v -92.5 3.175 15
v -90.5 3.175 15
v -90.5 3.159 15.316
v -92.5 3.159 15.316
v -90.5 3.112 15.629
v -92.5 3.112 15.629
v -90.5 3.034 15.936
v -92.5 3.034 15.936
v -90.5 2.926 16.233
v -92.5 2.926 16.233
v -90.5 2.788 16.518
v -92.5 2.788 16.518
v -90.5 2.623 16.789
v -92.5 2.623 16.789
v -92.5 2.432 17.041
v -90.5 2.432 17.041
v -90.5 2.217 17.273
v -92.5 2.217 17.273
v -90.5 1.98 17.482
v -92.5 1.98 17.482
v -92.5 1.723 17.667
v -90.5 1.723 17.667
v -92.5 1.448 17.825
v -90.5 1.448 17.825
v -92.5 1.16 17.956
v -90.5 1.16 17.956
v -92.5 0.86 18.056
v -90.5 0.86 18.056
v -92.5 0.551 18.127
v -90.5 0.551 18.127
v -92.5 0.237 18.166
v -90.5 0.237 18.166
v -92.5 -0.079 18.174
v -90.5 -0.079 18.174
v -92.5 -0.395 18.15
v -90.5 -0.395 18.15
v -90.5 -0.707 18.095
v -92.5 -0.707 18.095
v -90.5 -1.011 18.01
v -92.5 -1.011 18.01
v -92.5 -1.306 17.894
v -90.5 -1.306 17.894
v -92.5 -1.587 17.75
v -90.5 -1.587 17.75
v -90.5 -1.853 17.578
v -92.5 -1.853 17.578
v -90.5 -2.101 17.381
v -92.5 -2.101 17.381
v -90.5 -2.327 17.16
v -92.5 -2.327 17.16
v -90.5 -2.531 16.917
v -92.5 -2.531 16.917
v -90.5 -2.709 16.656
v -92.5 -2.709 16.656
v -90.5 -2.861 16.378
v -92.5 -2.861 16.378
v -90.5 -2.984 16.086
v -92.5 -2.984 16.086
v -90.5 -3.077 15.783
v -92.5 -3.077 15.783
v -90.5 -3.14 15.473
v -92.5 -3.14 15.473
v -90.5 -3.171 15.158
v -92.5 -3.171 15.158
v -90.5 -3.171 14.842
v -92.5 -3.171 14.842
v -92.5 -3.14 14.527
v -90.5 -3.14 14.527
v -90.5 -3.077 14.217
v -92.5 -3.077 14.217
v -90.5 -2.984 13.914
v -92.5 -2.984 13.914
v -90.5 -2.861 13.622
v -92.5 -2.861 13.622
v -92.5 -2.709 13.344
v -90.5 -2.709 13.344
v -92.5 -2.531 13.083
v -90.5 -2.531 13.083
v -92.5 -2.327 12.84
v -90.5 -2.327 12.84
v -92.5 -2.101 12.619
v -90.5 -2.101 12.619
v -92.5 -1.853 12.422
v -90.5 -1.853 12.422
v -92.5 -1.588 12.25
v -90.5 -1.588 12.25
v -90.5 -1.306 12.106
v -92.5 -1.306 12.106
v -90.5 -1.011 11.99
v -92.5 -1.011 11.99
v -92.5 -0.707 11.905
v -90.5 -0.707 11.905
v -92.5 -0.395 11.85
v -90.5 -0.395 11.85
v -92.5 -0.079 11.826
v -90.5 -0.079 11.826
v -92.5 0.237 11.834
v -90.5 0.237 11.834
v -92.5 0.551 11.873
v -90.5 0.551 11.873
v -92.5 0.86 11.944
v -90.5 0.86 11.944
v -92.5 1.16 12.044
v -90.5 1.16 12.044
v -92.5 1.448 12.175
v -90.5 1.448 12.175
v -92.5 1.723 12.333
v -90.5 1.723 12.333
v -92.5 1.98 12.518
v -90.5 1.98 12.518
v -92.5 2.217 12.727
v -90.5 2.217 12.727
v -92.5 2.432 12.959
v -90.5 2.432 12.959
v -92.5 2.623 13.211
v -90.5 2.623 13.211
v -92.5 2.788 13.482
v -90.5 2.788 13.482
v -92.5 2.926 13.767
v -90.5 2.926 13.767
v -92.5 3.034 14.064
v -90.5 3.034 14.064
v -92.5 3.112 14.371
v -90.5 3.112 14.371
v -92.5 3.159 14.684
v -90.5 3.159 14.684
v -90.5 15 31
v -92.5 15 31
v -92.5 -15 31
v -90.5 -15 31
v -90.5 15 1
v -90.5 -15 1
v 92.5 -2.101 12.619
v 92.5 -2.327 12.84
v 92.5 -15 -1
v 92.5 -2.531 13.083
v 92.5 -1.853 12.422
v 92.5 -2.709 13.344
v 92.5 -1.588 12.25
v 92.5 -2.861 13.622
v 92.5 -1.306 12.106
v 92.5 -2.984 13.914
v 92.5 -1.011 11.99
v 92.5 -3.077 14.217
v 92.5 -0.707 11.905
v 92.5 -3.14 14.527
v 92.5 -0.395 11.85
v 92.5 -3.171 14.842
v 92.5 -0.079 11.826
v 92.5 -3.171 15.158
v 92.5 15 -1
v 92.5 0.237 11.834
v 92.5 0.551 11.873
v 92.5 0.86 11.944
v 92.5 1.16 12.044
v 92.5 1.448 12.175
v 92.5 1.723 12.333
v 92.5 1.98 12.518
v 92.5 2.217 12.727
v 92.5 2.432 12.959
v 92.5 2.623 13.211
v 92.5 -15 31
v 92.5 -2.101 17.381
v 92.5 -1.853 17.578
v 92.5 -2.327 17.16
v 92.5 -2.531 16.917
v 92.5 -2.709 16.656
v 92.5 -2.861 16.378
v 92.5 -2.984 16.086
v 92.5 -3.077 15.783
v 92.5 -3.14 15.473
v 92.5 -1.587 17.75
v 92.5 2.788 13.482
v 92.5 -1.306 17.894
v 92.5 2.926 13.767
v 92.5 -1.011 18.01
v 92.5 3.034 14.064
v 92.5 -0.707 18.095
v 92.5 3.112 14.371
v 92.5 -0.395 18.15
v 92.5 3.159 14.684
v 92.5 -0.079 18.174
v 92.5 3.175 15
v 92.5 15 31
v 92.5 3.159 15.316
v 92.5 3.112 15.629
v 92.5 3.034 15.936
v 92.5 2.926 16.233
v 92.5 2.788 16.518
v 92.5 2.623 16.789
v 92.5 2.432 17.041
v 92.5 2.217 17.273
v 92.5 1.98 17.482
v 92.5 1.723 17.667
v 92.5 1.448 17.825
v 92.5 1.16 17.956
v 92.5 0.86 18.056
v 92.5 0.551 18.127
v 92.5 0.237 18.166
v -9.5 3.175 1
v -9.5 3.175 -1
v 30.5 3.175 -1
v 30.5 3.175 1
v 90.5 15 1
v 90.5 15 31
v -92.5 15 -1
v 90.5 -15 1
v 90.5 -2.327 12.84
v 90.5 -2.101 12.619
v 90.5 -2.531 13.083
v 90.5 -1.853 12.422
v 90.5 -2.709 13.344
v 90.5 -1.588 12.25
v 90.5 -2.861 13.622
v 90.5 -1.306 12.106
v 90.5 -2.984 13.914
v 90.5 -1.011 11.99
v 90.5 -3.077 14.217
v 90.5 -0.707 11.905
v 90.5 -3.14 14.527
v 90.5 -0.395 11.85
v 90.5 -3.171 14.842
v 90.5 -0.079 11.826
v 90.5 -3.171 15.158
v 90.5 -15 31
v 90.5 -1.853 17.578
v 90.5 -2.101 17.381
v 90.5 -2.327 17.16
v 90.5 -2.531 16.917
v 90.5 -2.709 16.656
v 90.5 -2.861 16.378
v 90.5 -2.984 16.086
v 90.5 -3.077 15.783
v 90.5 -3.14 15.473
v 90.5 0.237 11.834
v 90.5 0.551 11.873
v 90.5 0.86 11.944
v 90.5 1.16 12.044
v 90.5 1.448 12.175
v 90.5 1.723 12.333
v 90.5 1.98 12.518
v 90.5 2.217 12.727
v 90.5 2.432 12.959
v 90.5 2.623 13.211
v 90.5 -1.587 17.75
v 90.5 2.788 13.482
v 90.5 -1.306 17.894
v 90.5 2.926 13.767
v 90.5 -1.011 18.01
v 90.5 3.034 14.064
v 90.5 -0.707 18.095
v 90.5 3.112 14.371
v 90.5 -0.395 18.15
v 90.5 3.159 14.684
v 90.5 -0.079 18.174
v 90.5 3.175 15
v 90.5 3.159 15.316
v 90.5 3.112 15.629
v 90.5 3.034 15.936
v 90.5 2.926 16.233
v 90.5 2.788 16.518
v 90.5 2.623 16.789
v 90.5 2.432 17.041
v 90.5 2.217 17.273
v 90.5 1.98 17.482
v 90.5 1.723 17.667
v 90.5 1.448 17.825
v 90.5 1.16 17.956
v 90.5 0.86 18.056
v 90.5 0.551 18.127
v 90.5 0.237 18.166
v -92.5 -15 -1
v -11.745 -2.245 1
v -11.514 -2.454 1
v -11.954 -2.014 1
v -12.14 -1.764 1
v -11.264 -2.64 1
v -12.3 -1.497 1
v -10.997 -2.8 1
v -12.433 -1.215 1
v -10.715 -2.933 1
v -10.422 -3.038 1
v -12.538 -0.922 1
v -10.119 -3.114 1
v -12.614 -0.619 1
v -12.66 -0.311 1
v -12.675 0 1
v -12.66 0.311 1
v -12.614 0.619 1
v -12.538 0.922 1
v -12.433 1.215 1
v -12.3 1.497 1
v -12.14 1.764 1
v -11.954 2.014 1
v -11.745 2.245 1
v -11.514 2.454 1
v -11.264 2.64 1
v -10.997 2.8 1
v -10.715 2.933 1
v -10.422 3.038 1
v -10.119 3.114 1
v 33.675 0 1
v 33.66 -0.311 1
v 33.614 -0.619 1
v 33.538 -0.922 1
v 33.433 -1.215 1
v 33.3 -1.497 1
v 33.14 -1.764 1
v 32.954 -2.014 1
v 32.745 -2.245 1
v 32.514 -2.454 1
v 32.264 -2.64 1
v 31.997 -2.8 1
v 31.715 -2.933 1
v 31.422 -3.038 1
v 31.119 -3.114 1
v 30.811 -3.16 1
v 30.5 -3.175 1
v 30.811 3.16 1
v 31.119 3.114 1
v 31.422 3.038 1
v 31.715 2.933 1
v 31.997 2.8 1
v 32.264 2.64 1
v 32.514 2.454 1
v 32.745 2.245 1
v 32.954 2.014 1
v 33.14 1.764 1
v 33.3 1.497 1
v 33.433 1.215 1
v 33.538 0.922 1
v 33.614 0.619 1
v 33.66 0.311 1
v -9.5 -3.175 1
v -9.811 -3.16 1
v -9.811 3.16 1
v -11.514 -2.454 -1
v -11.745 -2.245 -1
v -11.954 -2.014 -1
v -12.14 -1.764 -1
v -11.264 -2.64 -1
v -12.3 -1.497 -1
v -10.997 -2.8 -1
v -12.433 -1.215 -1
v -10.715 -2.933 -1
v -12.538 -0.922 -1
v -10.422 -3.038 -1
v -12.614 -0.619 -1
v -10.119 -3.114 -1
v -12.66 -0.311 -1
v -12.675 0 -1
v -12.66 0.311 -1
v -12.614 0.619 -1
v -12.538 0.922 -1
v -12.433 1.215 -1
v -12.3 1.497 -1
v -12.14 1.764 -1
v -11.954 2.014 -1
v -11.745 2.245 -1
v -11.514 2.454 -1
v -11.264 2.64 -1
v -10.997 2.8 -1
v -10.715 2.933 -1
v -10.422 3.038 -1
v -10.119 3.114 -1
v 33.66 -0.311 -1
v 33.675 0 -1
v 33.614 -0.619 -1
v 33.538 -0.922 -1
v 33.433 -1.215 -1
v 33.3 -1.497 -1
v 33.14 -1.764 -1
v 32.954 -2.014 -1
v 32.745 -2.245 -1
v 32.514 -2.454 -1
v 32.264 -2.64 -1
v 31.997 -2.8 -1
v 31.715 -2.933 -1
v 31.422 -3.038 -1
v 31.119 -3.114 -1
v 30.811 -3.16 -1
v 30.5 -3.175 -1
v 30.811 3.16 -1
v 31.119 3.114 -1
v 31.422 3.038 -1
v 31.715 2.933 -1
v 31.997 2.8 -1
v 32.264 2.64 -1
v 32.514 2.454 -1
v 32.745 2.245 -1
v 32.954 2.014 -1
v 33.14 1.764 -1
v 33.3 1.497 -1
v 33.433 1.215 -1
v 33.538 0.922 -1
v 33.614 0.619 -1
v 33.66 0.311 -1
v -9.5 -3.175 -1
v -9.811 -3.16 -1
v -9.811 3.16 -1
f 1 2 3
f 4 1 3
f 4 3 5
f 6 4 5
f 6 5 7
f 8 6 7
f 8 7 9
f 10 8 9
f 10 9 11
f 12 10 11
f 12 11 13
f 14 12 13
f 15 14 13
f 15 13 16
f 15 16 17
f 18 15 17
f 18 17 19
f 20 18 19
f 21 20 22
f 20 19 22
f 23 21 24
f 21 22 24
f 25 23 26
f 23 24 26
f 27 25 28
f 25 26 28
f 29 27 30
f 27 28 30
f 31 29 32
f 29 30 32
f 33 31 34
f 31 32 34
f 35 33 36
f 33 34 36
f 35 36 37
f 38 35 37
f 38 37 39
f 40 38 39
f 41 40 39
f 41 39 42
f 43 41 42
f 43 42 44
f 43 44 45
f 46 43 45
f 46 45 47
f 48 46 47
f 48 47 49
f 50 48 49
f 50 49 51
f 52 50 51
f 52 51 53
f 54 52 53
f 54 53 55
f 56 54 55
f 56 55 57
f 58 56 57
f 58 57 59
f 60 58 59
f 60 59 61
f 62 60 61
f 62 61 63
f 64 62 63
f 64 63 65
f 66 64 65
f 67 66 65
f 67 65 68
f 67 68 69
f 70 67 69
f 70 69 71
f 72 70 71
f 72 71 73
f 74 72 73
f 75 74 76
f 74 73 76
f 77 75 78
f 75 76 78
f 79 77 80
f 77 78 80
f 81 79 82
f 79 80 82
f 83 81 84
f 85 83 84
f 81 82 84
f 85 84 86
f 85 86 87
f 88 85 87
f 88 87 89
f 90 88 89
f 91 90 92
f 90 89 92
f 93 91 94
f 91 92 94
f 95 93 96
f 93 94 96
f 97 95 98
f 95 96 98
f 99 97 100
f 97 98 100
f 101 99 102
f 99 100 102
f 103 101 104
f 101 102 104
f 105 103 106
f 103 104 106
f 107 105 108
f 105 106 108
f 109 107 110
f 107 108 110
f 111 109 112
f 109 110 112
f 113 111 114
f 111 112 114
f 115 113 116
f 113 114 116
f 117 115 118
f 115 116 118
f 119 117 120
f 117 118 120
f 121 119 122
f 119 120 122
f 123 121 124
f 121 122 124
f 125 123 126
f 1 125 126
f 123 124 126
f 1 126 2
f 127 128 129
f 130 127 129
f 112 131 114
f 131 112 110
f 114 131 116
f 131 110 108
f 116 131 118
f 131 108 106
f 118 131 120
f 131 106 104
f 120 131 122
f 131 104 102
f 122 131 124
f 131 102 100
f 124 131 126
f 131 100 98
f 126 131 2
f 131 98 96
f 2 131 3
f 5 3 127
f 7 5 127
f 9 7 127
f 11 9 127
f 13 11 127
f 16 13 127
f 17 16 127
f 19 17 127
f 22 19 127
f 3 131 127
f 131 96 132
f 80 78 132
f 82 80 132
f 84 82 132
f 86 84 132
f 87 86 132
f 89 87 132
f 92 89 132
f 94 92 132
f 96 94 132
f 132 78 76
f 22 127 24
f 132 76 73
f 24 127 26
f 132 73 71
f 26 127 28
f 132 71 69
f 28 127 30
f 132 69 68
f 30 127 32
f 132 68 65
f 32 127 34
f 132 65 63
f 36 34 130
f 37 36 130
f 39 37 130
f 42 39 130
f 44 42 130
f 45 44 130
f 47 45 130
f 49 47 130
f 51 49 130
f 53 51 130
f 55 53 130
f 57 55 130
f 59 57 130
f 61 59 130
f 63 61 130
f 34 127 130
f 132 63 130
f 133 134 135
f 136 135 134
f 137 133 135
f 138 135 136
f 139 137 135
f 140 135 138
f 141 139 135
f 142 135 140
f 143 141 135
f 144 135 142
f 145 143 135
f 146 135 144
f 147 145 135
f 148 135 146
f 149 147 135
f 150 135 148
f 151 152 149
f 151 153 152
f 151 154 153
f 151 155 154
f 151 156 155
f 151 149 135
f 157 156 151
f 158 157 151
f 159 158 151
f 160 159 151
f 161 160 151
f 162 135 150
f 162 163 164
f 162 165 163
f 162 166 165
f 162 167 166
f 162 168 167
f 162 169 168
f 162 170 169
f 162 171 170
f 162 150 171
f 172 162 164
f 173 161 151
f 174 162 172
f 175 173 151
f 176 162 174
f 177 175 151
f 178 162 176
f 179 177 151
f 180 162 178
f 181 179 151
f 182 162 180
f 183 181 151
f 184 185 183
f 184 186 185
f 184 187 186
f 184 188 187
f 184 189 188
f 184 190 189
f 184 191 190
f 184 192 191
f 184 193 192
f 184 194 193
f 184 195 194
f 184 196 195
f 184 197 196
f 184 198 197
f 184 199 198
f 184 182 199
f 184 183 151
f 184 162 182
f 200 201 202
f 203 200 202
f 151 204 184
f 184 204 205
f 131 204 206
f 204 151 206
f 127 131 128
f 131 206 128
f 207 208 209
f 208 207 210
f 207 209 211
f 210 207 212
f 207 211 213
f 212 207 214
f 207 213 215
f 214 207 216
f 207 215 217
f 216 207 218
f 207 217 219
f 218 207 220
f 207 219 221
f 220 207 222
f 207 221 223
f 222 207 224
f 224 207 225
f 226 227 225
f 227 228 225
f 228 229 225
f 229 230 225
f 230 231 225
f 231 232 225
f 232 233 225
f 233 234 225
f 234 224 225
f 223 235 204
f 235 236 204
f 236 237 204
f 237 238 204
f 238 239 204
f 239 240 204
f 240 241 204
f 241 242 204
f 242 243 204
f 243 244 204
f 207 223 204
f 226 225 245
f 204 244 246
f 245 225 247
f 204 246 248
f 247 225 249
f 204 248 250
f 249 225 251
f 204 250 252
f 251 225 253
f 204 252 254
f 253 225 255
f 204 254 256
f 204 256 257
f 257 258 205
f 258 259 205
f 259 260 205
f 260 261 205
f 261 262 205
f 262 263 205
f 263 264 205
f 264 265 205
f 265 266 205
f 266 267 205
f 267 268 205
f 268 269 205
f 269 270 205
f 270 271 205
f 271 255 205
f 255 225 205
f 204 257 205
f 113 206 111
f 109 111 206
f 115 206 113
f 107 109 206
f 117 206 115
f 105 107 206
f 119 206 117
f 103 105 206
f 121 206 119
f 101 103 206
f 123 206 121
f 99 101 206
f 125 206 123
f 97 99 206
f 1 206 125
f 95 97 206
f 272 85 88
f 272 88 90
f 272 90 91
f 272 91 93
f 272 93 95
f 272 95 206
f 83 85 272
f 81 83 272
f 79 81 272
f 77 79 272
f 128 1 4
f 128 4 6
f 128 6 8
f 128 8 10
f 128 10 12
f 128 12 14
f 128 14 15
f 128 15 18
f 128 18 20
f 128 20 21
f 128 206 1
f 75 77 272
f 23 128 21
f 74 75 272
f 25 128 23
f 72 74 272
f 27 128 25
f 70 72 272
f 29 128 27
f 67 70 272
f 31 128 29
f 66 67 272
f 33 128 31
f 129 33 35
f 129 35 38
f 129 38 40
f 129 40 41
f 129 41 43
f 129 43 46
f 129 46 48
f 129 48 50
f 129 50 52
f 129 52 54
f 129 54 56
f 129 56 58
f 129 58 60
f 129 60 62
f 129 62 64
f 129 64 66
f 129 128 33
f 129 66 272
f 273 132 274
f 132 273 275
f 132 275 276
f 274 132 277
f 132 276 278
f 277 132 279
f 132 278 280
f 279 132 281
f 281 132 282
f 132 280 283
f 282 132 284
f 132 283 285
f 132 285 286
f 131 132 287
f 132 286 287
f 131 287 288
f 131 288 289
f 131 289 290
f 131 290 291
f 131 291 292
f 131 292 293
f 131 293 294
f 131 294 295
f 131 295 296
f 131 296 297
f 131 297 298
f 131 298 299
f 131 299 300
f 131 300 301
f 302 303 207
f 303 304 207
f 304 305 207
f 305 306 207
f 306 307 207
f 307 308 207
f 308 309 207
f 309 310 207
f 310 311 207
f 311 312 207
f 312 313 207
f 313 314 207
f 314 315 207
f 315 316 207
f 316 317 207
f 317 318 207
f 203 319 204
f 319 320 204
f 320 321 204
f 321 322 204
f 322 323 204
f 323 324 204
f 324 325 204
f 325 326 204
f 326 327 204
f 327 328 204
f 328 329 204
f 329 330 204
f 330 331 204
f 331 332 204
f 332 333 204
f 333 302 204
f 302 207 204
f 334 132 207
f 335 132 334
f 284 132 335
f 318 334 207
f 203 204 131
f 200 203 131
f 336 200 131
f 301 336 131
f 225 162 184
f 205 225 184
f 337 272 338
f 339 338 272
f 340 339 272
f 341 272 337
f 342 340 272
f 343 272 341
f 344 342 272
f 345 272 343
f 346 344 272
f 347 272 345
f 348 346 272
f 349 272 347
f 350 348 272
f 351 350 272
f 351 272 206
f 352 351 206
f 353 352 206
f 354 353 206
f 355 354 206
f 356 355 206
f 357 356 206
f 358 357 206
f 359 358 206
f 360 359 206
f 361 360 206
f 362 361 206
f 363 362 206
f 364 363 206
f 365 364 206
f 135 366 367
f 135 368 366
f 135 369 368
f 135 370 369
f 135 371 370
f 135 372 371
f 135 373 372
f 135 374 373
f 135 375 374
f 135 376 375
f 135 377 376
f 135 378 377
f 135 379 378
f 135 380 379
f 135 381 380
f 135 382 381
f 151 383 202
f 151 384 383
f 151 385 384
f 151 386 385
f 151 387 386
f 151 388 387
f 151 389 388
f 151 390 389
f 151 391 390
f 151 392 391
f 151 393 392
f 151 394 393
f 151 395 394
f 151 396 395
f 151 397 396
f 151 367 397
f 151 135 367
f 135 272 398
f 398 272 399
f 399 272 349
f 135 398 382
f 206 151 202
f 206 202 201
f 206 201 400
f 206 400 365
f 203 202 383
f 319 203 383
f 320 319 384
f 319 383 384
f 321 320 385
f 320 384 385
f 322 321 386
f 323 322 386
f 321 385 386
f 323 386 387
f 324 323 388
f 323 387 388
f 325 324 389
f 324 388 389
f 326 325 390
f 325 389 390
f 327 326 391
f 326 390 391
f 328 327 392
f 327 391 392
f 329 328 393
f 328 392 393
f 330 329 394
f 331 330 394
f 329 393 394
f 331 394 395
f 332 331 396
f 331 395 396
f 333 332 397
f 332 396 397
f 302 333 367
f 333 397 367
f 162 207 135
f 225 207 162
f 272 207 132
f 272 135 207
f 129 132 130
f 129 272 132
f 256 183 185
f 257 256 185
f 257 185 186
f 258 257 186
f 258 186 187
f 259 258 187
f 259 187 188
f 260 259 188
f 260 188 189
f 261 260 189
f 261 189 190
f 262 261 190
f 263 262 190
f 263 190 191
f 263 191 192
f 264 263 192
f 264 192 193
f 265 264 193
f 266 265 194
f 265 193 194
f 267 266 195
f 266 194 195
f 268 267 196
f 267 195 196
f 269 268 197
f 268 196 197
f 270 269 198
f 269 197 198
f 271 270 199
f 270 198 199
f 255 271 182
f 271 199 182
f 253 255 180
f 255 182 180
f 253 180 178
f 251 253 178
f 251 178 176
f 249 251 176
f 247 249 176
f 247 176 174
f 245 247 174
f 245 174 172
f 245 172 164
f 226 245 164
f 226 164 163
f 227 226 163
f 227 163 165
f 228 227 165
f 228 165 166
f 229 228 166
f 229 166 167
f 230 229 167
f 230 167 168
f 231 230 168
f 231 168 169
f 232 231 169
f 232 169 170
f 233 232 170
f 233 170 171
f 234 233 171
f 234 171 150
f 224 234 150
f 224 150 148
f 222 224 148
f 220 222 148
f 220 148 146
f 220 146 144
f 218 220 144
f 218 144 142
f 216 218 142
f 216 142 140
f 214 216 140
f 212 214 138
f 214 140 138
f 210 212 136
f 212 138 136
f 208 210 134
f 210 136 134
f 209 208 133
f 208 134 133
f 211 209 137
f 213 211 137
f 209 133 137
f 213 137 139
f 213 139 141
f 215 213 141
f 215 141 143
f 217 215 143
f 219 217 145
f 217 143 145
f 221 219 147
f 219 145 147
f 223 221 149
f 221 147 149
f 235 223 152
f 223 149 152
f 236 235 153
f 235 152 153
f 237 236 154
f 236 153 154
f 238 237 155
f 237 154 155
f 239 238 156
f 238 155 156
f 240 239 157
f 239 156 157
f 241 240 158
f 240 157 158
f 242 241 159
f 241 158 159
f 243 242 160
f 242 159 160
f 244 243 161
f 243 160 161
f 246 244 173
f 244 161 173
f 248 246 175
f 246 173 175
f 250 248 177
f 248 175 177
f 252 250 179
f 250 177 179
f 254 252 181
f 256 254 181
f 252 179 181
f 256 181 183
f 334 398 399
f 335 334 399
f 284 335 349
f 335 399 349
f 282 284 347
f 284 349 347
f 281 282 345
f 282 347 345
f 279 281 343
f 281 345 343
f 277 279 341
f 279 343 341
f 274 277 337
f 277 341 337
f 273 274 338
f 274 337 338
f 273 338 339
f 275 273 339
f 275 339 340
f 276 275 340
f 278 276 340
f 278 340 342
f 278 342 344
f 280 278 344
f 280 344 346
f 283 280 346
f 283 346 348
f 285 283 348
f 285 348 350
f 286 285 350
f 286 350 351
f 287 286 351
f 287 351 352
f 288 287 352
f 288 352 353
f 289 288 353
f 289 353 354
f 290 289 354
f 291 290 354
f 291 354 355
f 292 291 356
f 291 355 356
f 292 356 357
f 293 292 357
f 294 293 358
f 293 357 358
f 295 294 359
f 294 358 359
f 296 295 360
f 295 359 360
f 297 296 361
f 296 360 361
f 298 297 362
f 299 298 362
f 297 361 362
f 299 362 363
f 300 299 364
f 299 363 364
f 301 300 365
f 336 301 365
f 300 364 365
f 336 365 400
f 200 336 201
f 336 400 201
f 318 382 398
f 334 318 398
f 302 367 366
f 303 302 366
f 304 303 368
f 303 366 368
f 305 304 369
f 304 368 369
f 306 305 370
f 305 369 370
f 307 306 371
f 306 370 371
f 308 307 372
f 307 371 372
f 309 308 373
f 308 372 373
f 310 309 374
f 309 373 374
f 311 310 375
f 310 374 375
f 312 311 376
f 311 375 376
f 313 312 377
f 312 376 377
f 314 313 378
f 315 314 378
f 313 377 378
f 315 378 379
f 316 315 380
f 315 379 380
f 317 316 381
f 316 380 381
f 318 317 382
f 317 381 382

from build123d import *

# Parameters (mm, degrees)
F0_W     = 30
F0_H     = 2
F1_DEPTH = 92.5
F2_W     = 30
F2_H     = 30
F3_DEPTH = 2
F4_W     = 30
F4_H     = 30
F5_DEPTH = 2
F6_R     = 3.175
F7_DEPTH = 250
F9_DEPTH = 25


with BuildPart() as f1:
    # F0 (on Right) → F1 (new body, symmetric)
    with BuildSketch(Plane.YZ):
        Rectangle(F0_W, F0_H)
    extrude(amount=F1_DEPTH, both=True)

    # F2 (on face) → F3 (join)
    with BuildSketch(Plane.YZ.offset(92.5)):
        with Locations((0, 16)):
            Rectangle(F2_W, F2_H)
    extrude(amount=-F3_DEPTH)

    # F4 (on face) → F5 (join)
    with BuildSketch(Plane(origin=(-92.5, 0, 0), x_dir=(0, -1, 0), z_dir=(-1, 0, 0))):
        with Locations((0, 16)):
            Rectangle(F4_W, F4_H)
    extrude(amount=-F5_DEPTH)

    # F6 (on face) → F7 (cut)
    with BuildSketch(Plane.YZ.offset(92.5)):
        with Locations((0, 15)):
            Circle(F6_R)
    extrude(amount=-F7_DEPTH, mode=Mode.SUBTRACT)

    # F8 (on face) → F9 (cut)
    with BuildSketch(Plane(origin=(0, 0, -1), x_dir=(1, 0, 0), z_dir=(0, 0, -1))):
        with BuildLine():
            ThreePointArc((30.5, -3.175), (32.7450640303, -2.2450640303), (33.675, 0))
            ThreePointArc((33.675, 0), (32.7450640303, 2.2450640303), (30.5, 3.175))
            ThreePointArc((30.5, 3.175), (27.325, 0), (30.5, -3.175))
        make_face()
        with BuildLine():
            ThreePointArc((30.5, -3.175), (27.325, 0), (30.5, 3.175))
            Line((30.5, 3.175), (-9.5, 3.175))
            ThreePointArc((-9.5, 3.175), (-7.2549359697, 2.2450640303), (-6.325, 0))
            ThreePointArc((-6.325, 0), (-7.2549359697, -2.2450640303), (-9.5, -3.175))
            Line((-9.5, -3.175), (30.5, -3.175))
        make_face()
        with BuildLine():
            ThreePointArc((-6.325, 0), (-7.2549359697, 2.2450640303), (-9.5, 3.175))
            ThreePointArc((-9.5, 3.175), (-12.675, 0), (-9.5, -3.175))
            ThreePointArc((-9.5, -3.175), (-7.2549359697, -2.2450640303), (-6.325, 0))
        make_face()
    extrude(amount=-F9_DEPTH, mode=Mode.SUBTRACT)


solid = f1.part
